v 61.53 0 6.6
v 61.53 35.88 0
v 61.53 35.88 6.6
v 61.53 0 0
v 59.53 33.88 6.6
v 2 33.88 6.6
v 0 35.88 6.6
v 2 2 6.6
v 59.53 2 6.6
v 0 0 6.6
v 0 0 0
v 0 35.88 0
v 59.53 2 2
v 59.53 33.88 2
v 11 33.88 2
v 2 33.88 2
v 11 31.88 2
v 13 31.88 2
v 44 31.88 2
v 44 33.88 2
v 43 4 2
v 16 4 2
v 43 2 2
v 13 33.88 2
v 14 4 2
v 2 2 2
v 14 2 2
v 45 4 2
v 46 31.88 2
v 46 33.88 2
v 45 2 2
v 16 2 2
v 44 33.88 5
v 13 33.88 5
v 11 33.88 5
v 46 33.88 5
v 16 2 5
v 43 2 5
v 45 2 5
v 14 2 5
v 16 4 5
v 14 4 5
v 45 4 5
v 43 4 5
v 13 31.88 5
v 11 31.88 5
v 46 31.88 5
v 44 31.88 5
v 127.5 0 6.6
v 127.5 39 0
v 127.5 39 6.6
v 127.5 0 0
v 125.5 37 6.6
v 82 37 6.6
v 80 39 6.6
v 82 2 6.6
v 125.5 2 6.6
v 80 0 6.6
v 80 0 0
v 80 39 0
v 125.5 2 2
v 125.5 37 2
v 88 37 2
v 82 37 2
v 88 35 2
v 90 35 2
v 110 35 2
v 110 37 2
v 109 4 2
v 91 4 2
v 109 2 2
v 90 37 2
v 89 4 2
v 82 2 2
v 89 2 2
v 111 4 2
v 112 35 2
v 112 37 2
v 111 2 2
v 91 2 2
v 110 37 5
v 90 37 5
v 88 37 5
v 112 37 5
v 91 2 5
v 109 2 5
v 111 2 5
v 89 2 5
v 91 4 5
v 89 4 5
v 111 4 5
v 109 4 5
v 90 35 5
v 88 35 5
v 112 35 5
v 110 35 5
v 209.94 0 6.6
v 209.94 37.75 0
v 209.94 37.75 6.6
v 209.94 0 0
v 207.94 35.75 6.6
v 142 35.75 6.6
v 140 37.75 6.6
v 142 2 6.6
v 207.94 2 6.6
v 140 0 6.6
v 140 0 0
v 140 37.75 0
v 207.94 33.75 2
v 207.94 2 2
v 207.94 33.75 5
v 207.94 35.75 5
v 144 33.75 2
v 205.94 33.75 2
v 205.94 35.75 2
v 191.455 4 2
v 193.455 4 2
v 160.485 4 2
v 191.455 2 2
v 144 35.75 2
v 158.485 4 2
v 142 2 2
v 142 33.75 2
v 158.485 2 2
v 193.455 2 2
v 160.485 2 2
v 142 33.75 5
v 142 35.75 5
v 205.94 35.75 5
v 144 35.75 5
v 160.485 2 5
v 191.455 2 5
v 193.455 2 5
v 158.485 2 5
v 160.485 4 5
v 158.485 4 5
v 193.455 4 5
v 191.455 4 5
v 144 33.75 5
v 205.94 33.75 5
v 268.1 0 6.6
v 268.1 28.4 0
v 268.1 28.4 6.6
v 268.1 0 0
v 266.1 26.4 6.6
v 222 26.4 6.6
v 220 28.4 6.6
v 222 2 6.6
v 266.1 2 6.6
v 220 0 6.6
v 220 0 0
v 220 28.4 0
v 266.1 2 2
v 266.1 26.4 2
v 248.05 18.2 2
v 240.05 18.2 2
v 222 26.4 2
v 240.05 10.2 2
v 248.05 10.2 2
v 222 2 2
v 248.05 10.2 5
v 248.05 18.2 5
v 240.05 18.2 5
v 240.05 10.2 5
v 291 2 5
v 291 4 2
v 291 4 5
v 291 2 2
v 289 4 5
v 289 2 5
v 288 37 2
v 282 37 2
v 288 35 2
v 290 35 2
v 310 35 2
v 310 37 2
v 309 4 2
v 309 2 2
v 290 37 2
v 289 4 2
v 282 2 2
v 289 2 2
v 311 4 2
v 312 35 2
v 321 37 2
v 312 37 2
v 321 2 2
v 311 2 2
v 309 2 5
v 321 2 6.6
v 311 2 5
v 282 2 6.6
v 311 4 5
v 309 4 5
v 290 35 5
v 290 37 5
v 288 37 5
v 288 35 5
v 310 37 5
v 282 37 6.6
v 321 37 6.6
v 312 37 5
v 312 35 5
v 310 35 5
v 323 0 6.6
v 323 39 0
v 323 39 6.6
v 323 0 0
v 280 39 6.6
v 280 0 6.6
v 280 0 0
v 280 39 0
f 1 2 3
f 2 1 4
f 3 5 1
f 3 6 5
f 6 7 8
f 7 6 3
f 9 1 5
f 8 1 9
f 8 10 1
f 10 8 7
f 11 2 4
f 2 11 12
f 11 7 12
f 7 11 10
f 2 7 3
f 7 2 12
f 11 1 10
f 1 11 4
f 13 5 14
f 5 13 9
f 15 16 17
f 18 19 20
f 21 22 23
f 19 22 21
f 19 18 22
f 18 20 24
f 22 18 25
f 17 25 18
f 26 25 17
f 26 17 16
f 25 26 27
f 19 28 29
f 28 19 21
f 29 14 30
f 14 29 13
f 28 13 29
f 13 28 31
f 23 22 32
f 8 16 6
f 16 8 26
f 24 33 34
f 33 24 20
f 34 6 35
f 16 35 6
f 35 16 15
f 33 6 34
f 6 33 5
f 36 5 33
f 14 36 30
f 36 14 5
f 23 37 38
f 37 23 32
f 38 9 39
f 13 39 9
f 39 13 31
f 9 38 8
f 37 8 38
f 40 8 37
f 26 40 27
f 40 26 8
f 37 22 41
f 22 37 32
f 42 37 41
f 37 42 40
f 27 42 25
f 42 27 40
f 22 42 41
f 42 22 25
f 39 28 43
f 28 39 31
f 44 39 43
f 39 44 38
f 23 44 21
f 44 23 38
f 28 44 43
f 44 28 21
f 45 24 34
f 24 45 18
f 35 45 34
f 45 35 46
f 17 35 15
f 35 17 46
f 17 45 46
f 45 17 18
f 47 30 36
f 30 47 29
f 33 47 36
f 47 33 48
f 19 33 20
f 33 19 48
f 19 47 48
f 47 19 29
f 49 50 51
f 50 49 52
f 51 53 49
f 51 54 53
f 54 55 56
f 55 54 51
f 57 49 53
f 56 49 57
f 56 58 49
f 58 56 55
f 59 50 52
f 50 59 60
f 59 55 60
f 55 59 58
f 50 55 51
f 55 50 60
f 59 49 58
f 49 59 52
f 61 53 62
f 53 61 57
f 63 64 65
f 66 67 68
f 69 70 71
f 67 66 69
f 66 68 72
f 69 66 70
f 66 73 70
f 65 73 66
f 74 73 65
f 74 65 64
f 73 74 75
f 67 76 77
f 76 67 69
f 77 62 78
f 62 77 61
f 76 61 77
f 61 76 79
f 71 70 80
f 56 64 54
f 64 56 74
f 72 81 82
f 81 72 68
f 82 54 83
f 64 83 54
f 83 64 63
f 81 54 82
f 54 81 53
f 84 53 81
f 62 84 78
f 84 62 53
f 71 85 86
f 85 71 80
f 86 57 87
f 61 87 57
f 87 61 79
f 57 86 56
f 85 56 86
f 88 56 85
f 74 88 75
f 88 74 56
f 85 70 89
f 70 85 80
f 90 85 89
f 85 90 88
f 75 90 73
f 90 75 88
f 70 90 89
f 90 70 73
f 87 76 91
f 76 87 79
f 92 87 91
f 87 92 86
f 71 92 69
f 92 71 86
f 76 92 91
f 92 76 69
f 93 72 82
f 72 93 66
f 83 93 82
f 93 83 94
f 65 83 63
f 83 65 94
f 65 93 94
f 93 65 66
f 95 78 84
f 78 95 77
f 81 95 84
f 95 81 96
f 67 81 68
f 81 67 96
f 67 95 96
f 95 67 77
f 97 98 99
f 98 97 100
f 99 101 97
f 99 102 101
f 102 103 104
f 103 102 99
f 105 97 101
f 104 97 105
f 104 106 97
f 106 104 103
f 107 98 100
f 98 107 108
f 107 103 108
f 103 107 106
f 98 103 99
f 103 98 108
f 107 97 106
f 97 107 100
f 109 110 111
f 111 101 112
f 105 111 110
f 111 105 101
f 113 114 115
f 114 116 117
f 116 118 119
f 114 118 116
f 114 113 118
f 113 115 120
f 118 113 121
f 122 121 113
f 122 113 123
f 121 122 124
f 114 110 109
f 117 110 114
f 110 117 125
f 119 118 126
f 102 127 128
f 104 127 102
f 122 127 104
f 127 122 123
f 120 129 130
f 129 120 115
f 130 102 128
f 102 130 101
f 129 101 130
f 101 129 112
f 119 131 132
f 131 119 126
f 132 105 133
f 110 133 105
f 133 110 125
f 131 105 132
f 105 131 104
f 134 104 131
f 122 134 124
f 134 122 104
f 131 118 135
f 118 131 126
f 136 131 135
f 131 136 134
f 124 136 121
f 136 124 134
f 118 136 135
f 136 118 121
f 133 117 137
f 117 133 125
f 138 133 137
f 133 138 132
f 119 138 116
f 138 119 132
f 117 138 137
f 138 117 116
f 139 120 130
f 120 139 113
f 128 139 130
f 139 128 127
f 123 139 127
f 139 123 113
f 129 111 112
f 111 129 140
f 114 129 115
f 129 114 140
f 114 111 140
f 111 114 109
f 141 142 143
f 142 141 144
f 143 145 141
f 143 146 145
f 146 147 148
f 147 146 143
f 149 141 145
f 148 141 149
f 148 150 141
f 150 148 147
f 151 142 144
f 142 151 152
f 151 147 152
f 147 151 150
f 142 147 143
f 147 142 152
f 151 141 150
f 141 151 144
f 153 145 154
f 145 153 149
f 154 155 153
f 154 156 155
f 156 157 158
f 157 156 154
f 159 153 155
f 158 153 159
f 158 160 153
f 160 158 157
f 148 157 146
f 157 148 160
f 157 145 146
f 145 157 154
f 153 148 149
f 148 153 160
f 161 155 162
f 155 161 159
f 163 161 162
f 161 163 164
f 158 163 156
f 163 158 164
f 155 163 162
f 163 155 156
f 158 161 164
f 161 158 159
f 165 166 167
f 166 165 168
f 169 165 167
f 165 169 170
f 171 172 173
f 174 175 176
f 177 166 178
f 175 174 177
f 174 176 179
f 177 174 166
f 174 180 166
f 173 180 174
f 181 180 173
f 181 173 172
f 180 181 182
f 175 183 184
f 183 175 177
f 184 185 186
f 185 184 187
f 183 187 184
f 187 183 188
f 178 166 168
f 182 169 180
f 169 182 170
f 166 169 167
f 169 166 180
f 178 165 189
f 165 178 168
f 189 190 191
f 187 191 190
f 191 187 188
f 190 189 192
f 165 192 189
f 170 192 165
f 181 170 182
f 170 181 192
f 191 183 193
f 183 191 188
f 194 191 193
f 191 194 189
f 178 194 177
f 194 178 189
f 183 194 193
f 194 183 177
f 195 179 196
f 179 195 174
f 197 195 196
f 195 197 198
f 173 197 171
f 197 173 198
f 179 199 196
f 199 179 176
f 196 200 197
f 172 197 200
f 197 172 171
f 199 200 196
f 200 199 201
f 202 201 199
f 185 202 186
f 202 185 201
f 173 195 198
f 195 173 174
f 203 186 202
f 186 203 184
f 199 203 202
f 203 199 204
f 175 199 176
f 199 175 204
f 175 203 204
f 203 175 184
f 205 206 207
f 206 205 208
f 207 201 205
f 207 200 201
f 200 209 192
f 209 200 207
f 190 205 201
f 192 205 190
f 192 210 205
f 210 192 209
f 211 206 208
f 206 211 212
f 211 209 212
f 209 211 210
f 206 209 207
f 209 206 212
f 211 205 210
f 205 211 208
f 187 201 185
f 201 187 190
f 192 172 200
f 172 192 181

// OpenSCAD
// file: pcb-model-sizes.scad
pcbSmtLvSize=[65.94, 33.75];
pcbDevkitcRelaySize=[57.53, 31.88];
pcbCurrentSensorSize=[43.5, 35];
pcbCurrentSensorMiniSize=[39, 35];
pcbCurrentSensorMiniPadDepth=15;
pcbContactorPsuSize=[44.1, 24.4];
pcbContactorInterfaceRelaySize=[41.3,34.8];

pcbRelayHeight = 18.5;
pcbTallCompoent = 15;
pcbShortComponent = 6;

pcbThickness = 1.6;
solderThickness = 3;
wallThickness = 1.5;
partitionThickness = 0.8;

caseMargin = 0.2;
// main file
include <pcb-model-sizes.scad>

relayTopStands=[9, 42];
relayBottomStands = [12, 41];

module bentoRelay(wallThickness=[2,2,2], solderThickness=3, boardThickness=1.6, standSize = 2) {
    difference() {
        cube([wallThickness[0] * 2 + pcbDevkitcRelaySize[0], wallThickness[1] * 2 + pcbDevkitcRelaySize[1], wallThickness[2] + solderThickness + boardThickness]);
        translate([wallThickness[0], wallThickness[1], wallThickness[2]]) {
            cube([pcbDevkitcRelaySize[0], pcbDevkitcRelaySize[1], solderThickness + boardThickness + 0.01]);
        }
    }
    translate(wallThickness) {
        for(stand = relayBottomStands) {
            translate([stand, 0, 0]){
               cube([standSize, standSize, solderThickness]);
            }
        }
    }
    translate(wallThickness + [0, pcbDevkitcRelaySize[1] - standSize, 0]) {
        for(stand = relayTopStands) {
            translate([stand, 0, 0]){
               cube([standSize, standSize, solderThickness]);
            }
        }
    }
}

bentoRelay();


currentTopStands=[6, 28];
currentBottomStands = [7, 27];

module bentoCurrentSensor(wallThickness=[2,2,2], solderThickness=3, boardThickness=1.6, standSize = 2) {
    difference() {
        cube([wallThickness[0] * 2 + pcbCurrentSensorSize[0], wallThickness[1] * 2 + pcbCurrentSensorSize[1], wallThickness[2] + solderThickness + boardThickness]);
        translate([wallThickness[0], wallThickness[1], wallThickness[2]]) {
            cube([pcbCurrentSensorSize[0], pcbCurrentSensorSize[1], solderThickness + boardThickness + 0.01]);
        }
    }
    translate(wallThickness) {
        for(stand = currentBottomStands) {
            translate([stand, 0, 0]){
               cube([standSize, standSize, solderThickness]);
            }
        }
    }
    translate(wallThickness + [0, pcbCurrentSensorSize[1] - standSize, 0]) {
        for(stand = currentTopStands) {
            translate([stand, 0, 0]){
               cube([standSize, standSize, solderThickness]);
            }
        }
    }
}

translate([80, 0, 0]) {
    bentoCurrentSensor();
}


smtLvTopStands=[0, pcbSmtLvSize[0] - 2 ];
smtLvBottomStands=[pcbSmtLvSize[0]/4, pcbSmtLvSize[0] - pcbSmtLvSize[0]/4 ];

module bentoSmtLv(wallThickness=[2,2,2], solderThickness=3, boardThickness=1.6, standSize = 2, topWall=true) {
    difference() {
        cube([wallThickness[0] * (topWall ? 2 : 1) + pcbSmtLvSize[0], wallThickness[1] * 2 + pcbSmtLvSize[1], wallThickness[2] + solderThickness + boardThickness]);
        translate([wallThickness[0], wallThickness[1], wallThickness[2]]) {
            cube([pcbSmtLvSize[0], pcbSmtLvSize[1], solderThickness + boardThickness + 0.01]);
        }
    }
    translate(wallThickness) {
        for(stand = smtLvBottomStands) {
            translate([stand, 0, 0]){
               cube([standSize, standSize, solderThickness]);
            }
        }
    }
    translate(wallThickness + [0, pcbSmtLvSize[1] - standSize, 0]) {
        for(stand = smtLvTopStands) {
            translate([stand, 0, 0]){
               cube([standSize, standSize, solderThickness]);
            }
        }
    }
}

translate([140, 0, 0]) {
    bentoSmtLv();
}


echo(pcbContactorPsuSize[0]);

module bentoContactorPsu(wallThickness=[2,2,2], solderThickness=3, boardThickness=1.6, standSize = 2) {
    difference() {
        cube([wallThickness[0] * 2 + pcbContactorPsuSize[0], wallThickness[1] * 2 + pcbContactorPsuSize[1], wallThickness[2] + solderThickness + boardThickness]);
        translate([wallThickness[0], wallThickness[1], wallThickness[2]]) {
            cube([pcbContactorPsuSize[0], pcbContactorPsuSize[1], solderThickness + boardThickness + 0.01]);
        }
    }

    translate([wallThickness[0] + pcbContactorPsuSize[0] / 2 - 2 * standSize, wallThickness[1] + pcbContactorPsuSize[1] / 2 - 2 * standSize, wallThickness[2]]) {
        cube([4 * standSize, 4 * standSize, solderThickness]);
    }
}

translate([220, 0, 0]) {
    bentoContactorPsu();
}

currentMiniTopStands=[6, 28];
currentMiniBottomStands = [7, 27];

module bentoCurrentSensorMini(wallThickness=[2,2,2], solderThickness=3, boardThickness=1.6, standSize = 2) {
    difference() {
        cube([wallThickness[0] * 2 + pcbCurrentSensorMiniSize[0], wallThickness[1] * 2 + pcbCurrentSensorMiniSize[1], wallThickness[2] + solderThickness + boardThickness]);
        translate([wallThickness[0], wallThickness[1], wallThickness[2]]) {
            cube([pcbCurrentSensorMiniSize[0], pcbCurrentSensorMiniSize[1], solderThickness + boardThickness + 0.01]);
        }
    }
    translate(wallThickness) {
        for(stand = currentBottomStands) {
            translate([stand, 0, 0]){
               cube([standSize, standSize, solderThickness]);
            }
        }
    }
    translate(wallThickness + [0, pcbCurrentSensorMiniSize[1] - standSize, 0]) {
        for(stand = currentTopStands) {
            translate([stand, 0, 0]){
               cube([standSize, standSize, solderThickness]);
            }
        }
    }
}

translate([280, 0, 0]) {
    bentoCurrentSensorMini();
}
